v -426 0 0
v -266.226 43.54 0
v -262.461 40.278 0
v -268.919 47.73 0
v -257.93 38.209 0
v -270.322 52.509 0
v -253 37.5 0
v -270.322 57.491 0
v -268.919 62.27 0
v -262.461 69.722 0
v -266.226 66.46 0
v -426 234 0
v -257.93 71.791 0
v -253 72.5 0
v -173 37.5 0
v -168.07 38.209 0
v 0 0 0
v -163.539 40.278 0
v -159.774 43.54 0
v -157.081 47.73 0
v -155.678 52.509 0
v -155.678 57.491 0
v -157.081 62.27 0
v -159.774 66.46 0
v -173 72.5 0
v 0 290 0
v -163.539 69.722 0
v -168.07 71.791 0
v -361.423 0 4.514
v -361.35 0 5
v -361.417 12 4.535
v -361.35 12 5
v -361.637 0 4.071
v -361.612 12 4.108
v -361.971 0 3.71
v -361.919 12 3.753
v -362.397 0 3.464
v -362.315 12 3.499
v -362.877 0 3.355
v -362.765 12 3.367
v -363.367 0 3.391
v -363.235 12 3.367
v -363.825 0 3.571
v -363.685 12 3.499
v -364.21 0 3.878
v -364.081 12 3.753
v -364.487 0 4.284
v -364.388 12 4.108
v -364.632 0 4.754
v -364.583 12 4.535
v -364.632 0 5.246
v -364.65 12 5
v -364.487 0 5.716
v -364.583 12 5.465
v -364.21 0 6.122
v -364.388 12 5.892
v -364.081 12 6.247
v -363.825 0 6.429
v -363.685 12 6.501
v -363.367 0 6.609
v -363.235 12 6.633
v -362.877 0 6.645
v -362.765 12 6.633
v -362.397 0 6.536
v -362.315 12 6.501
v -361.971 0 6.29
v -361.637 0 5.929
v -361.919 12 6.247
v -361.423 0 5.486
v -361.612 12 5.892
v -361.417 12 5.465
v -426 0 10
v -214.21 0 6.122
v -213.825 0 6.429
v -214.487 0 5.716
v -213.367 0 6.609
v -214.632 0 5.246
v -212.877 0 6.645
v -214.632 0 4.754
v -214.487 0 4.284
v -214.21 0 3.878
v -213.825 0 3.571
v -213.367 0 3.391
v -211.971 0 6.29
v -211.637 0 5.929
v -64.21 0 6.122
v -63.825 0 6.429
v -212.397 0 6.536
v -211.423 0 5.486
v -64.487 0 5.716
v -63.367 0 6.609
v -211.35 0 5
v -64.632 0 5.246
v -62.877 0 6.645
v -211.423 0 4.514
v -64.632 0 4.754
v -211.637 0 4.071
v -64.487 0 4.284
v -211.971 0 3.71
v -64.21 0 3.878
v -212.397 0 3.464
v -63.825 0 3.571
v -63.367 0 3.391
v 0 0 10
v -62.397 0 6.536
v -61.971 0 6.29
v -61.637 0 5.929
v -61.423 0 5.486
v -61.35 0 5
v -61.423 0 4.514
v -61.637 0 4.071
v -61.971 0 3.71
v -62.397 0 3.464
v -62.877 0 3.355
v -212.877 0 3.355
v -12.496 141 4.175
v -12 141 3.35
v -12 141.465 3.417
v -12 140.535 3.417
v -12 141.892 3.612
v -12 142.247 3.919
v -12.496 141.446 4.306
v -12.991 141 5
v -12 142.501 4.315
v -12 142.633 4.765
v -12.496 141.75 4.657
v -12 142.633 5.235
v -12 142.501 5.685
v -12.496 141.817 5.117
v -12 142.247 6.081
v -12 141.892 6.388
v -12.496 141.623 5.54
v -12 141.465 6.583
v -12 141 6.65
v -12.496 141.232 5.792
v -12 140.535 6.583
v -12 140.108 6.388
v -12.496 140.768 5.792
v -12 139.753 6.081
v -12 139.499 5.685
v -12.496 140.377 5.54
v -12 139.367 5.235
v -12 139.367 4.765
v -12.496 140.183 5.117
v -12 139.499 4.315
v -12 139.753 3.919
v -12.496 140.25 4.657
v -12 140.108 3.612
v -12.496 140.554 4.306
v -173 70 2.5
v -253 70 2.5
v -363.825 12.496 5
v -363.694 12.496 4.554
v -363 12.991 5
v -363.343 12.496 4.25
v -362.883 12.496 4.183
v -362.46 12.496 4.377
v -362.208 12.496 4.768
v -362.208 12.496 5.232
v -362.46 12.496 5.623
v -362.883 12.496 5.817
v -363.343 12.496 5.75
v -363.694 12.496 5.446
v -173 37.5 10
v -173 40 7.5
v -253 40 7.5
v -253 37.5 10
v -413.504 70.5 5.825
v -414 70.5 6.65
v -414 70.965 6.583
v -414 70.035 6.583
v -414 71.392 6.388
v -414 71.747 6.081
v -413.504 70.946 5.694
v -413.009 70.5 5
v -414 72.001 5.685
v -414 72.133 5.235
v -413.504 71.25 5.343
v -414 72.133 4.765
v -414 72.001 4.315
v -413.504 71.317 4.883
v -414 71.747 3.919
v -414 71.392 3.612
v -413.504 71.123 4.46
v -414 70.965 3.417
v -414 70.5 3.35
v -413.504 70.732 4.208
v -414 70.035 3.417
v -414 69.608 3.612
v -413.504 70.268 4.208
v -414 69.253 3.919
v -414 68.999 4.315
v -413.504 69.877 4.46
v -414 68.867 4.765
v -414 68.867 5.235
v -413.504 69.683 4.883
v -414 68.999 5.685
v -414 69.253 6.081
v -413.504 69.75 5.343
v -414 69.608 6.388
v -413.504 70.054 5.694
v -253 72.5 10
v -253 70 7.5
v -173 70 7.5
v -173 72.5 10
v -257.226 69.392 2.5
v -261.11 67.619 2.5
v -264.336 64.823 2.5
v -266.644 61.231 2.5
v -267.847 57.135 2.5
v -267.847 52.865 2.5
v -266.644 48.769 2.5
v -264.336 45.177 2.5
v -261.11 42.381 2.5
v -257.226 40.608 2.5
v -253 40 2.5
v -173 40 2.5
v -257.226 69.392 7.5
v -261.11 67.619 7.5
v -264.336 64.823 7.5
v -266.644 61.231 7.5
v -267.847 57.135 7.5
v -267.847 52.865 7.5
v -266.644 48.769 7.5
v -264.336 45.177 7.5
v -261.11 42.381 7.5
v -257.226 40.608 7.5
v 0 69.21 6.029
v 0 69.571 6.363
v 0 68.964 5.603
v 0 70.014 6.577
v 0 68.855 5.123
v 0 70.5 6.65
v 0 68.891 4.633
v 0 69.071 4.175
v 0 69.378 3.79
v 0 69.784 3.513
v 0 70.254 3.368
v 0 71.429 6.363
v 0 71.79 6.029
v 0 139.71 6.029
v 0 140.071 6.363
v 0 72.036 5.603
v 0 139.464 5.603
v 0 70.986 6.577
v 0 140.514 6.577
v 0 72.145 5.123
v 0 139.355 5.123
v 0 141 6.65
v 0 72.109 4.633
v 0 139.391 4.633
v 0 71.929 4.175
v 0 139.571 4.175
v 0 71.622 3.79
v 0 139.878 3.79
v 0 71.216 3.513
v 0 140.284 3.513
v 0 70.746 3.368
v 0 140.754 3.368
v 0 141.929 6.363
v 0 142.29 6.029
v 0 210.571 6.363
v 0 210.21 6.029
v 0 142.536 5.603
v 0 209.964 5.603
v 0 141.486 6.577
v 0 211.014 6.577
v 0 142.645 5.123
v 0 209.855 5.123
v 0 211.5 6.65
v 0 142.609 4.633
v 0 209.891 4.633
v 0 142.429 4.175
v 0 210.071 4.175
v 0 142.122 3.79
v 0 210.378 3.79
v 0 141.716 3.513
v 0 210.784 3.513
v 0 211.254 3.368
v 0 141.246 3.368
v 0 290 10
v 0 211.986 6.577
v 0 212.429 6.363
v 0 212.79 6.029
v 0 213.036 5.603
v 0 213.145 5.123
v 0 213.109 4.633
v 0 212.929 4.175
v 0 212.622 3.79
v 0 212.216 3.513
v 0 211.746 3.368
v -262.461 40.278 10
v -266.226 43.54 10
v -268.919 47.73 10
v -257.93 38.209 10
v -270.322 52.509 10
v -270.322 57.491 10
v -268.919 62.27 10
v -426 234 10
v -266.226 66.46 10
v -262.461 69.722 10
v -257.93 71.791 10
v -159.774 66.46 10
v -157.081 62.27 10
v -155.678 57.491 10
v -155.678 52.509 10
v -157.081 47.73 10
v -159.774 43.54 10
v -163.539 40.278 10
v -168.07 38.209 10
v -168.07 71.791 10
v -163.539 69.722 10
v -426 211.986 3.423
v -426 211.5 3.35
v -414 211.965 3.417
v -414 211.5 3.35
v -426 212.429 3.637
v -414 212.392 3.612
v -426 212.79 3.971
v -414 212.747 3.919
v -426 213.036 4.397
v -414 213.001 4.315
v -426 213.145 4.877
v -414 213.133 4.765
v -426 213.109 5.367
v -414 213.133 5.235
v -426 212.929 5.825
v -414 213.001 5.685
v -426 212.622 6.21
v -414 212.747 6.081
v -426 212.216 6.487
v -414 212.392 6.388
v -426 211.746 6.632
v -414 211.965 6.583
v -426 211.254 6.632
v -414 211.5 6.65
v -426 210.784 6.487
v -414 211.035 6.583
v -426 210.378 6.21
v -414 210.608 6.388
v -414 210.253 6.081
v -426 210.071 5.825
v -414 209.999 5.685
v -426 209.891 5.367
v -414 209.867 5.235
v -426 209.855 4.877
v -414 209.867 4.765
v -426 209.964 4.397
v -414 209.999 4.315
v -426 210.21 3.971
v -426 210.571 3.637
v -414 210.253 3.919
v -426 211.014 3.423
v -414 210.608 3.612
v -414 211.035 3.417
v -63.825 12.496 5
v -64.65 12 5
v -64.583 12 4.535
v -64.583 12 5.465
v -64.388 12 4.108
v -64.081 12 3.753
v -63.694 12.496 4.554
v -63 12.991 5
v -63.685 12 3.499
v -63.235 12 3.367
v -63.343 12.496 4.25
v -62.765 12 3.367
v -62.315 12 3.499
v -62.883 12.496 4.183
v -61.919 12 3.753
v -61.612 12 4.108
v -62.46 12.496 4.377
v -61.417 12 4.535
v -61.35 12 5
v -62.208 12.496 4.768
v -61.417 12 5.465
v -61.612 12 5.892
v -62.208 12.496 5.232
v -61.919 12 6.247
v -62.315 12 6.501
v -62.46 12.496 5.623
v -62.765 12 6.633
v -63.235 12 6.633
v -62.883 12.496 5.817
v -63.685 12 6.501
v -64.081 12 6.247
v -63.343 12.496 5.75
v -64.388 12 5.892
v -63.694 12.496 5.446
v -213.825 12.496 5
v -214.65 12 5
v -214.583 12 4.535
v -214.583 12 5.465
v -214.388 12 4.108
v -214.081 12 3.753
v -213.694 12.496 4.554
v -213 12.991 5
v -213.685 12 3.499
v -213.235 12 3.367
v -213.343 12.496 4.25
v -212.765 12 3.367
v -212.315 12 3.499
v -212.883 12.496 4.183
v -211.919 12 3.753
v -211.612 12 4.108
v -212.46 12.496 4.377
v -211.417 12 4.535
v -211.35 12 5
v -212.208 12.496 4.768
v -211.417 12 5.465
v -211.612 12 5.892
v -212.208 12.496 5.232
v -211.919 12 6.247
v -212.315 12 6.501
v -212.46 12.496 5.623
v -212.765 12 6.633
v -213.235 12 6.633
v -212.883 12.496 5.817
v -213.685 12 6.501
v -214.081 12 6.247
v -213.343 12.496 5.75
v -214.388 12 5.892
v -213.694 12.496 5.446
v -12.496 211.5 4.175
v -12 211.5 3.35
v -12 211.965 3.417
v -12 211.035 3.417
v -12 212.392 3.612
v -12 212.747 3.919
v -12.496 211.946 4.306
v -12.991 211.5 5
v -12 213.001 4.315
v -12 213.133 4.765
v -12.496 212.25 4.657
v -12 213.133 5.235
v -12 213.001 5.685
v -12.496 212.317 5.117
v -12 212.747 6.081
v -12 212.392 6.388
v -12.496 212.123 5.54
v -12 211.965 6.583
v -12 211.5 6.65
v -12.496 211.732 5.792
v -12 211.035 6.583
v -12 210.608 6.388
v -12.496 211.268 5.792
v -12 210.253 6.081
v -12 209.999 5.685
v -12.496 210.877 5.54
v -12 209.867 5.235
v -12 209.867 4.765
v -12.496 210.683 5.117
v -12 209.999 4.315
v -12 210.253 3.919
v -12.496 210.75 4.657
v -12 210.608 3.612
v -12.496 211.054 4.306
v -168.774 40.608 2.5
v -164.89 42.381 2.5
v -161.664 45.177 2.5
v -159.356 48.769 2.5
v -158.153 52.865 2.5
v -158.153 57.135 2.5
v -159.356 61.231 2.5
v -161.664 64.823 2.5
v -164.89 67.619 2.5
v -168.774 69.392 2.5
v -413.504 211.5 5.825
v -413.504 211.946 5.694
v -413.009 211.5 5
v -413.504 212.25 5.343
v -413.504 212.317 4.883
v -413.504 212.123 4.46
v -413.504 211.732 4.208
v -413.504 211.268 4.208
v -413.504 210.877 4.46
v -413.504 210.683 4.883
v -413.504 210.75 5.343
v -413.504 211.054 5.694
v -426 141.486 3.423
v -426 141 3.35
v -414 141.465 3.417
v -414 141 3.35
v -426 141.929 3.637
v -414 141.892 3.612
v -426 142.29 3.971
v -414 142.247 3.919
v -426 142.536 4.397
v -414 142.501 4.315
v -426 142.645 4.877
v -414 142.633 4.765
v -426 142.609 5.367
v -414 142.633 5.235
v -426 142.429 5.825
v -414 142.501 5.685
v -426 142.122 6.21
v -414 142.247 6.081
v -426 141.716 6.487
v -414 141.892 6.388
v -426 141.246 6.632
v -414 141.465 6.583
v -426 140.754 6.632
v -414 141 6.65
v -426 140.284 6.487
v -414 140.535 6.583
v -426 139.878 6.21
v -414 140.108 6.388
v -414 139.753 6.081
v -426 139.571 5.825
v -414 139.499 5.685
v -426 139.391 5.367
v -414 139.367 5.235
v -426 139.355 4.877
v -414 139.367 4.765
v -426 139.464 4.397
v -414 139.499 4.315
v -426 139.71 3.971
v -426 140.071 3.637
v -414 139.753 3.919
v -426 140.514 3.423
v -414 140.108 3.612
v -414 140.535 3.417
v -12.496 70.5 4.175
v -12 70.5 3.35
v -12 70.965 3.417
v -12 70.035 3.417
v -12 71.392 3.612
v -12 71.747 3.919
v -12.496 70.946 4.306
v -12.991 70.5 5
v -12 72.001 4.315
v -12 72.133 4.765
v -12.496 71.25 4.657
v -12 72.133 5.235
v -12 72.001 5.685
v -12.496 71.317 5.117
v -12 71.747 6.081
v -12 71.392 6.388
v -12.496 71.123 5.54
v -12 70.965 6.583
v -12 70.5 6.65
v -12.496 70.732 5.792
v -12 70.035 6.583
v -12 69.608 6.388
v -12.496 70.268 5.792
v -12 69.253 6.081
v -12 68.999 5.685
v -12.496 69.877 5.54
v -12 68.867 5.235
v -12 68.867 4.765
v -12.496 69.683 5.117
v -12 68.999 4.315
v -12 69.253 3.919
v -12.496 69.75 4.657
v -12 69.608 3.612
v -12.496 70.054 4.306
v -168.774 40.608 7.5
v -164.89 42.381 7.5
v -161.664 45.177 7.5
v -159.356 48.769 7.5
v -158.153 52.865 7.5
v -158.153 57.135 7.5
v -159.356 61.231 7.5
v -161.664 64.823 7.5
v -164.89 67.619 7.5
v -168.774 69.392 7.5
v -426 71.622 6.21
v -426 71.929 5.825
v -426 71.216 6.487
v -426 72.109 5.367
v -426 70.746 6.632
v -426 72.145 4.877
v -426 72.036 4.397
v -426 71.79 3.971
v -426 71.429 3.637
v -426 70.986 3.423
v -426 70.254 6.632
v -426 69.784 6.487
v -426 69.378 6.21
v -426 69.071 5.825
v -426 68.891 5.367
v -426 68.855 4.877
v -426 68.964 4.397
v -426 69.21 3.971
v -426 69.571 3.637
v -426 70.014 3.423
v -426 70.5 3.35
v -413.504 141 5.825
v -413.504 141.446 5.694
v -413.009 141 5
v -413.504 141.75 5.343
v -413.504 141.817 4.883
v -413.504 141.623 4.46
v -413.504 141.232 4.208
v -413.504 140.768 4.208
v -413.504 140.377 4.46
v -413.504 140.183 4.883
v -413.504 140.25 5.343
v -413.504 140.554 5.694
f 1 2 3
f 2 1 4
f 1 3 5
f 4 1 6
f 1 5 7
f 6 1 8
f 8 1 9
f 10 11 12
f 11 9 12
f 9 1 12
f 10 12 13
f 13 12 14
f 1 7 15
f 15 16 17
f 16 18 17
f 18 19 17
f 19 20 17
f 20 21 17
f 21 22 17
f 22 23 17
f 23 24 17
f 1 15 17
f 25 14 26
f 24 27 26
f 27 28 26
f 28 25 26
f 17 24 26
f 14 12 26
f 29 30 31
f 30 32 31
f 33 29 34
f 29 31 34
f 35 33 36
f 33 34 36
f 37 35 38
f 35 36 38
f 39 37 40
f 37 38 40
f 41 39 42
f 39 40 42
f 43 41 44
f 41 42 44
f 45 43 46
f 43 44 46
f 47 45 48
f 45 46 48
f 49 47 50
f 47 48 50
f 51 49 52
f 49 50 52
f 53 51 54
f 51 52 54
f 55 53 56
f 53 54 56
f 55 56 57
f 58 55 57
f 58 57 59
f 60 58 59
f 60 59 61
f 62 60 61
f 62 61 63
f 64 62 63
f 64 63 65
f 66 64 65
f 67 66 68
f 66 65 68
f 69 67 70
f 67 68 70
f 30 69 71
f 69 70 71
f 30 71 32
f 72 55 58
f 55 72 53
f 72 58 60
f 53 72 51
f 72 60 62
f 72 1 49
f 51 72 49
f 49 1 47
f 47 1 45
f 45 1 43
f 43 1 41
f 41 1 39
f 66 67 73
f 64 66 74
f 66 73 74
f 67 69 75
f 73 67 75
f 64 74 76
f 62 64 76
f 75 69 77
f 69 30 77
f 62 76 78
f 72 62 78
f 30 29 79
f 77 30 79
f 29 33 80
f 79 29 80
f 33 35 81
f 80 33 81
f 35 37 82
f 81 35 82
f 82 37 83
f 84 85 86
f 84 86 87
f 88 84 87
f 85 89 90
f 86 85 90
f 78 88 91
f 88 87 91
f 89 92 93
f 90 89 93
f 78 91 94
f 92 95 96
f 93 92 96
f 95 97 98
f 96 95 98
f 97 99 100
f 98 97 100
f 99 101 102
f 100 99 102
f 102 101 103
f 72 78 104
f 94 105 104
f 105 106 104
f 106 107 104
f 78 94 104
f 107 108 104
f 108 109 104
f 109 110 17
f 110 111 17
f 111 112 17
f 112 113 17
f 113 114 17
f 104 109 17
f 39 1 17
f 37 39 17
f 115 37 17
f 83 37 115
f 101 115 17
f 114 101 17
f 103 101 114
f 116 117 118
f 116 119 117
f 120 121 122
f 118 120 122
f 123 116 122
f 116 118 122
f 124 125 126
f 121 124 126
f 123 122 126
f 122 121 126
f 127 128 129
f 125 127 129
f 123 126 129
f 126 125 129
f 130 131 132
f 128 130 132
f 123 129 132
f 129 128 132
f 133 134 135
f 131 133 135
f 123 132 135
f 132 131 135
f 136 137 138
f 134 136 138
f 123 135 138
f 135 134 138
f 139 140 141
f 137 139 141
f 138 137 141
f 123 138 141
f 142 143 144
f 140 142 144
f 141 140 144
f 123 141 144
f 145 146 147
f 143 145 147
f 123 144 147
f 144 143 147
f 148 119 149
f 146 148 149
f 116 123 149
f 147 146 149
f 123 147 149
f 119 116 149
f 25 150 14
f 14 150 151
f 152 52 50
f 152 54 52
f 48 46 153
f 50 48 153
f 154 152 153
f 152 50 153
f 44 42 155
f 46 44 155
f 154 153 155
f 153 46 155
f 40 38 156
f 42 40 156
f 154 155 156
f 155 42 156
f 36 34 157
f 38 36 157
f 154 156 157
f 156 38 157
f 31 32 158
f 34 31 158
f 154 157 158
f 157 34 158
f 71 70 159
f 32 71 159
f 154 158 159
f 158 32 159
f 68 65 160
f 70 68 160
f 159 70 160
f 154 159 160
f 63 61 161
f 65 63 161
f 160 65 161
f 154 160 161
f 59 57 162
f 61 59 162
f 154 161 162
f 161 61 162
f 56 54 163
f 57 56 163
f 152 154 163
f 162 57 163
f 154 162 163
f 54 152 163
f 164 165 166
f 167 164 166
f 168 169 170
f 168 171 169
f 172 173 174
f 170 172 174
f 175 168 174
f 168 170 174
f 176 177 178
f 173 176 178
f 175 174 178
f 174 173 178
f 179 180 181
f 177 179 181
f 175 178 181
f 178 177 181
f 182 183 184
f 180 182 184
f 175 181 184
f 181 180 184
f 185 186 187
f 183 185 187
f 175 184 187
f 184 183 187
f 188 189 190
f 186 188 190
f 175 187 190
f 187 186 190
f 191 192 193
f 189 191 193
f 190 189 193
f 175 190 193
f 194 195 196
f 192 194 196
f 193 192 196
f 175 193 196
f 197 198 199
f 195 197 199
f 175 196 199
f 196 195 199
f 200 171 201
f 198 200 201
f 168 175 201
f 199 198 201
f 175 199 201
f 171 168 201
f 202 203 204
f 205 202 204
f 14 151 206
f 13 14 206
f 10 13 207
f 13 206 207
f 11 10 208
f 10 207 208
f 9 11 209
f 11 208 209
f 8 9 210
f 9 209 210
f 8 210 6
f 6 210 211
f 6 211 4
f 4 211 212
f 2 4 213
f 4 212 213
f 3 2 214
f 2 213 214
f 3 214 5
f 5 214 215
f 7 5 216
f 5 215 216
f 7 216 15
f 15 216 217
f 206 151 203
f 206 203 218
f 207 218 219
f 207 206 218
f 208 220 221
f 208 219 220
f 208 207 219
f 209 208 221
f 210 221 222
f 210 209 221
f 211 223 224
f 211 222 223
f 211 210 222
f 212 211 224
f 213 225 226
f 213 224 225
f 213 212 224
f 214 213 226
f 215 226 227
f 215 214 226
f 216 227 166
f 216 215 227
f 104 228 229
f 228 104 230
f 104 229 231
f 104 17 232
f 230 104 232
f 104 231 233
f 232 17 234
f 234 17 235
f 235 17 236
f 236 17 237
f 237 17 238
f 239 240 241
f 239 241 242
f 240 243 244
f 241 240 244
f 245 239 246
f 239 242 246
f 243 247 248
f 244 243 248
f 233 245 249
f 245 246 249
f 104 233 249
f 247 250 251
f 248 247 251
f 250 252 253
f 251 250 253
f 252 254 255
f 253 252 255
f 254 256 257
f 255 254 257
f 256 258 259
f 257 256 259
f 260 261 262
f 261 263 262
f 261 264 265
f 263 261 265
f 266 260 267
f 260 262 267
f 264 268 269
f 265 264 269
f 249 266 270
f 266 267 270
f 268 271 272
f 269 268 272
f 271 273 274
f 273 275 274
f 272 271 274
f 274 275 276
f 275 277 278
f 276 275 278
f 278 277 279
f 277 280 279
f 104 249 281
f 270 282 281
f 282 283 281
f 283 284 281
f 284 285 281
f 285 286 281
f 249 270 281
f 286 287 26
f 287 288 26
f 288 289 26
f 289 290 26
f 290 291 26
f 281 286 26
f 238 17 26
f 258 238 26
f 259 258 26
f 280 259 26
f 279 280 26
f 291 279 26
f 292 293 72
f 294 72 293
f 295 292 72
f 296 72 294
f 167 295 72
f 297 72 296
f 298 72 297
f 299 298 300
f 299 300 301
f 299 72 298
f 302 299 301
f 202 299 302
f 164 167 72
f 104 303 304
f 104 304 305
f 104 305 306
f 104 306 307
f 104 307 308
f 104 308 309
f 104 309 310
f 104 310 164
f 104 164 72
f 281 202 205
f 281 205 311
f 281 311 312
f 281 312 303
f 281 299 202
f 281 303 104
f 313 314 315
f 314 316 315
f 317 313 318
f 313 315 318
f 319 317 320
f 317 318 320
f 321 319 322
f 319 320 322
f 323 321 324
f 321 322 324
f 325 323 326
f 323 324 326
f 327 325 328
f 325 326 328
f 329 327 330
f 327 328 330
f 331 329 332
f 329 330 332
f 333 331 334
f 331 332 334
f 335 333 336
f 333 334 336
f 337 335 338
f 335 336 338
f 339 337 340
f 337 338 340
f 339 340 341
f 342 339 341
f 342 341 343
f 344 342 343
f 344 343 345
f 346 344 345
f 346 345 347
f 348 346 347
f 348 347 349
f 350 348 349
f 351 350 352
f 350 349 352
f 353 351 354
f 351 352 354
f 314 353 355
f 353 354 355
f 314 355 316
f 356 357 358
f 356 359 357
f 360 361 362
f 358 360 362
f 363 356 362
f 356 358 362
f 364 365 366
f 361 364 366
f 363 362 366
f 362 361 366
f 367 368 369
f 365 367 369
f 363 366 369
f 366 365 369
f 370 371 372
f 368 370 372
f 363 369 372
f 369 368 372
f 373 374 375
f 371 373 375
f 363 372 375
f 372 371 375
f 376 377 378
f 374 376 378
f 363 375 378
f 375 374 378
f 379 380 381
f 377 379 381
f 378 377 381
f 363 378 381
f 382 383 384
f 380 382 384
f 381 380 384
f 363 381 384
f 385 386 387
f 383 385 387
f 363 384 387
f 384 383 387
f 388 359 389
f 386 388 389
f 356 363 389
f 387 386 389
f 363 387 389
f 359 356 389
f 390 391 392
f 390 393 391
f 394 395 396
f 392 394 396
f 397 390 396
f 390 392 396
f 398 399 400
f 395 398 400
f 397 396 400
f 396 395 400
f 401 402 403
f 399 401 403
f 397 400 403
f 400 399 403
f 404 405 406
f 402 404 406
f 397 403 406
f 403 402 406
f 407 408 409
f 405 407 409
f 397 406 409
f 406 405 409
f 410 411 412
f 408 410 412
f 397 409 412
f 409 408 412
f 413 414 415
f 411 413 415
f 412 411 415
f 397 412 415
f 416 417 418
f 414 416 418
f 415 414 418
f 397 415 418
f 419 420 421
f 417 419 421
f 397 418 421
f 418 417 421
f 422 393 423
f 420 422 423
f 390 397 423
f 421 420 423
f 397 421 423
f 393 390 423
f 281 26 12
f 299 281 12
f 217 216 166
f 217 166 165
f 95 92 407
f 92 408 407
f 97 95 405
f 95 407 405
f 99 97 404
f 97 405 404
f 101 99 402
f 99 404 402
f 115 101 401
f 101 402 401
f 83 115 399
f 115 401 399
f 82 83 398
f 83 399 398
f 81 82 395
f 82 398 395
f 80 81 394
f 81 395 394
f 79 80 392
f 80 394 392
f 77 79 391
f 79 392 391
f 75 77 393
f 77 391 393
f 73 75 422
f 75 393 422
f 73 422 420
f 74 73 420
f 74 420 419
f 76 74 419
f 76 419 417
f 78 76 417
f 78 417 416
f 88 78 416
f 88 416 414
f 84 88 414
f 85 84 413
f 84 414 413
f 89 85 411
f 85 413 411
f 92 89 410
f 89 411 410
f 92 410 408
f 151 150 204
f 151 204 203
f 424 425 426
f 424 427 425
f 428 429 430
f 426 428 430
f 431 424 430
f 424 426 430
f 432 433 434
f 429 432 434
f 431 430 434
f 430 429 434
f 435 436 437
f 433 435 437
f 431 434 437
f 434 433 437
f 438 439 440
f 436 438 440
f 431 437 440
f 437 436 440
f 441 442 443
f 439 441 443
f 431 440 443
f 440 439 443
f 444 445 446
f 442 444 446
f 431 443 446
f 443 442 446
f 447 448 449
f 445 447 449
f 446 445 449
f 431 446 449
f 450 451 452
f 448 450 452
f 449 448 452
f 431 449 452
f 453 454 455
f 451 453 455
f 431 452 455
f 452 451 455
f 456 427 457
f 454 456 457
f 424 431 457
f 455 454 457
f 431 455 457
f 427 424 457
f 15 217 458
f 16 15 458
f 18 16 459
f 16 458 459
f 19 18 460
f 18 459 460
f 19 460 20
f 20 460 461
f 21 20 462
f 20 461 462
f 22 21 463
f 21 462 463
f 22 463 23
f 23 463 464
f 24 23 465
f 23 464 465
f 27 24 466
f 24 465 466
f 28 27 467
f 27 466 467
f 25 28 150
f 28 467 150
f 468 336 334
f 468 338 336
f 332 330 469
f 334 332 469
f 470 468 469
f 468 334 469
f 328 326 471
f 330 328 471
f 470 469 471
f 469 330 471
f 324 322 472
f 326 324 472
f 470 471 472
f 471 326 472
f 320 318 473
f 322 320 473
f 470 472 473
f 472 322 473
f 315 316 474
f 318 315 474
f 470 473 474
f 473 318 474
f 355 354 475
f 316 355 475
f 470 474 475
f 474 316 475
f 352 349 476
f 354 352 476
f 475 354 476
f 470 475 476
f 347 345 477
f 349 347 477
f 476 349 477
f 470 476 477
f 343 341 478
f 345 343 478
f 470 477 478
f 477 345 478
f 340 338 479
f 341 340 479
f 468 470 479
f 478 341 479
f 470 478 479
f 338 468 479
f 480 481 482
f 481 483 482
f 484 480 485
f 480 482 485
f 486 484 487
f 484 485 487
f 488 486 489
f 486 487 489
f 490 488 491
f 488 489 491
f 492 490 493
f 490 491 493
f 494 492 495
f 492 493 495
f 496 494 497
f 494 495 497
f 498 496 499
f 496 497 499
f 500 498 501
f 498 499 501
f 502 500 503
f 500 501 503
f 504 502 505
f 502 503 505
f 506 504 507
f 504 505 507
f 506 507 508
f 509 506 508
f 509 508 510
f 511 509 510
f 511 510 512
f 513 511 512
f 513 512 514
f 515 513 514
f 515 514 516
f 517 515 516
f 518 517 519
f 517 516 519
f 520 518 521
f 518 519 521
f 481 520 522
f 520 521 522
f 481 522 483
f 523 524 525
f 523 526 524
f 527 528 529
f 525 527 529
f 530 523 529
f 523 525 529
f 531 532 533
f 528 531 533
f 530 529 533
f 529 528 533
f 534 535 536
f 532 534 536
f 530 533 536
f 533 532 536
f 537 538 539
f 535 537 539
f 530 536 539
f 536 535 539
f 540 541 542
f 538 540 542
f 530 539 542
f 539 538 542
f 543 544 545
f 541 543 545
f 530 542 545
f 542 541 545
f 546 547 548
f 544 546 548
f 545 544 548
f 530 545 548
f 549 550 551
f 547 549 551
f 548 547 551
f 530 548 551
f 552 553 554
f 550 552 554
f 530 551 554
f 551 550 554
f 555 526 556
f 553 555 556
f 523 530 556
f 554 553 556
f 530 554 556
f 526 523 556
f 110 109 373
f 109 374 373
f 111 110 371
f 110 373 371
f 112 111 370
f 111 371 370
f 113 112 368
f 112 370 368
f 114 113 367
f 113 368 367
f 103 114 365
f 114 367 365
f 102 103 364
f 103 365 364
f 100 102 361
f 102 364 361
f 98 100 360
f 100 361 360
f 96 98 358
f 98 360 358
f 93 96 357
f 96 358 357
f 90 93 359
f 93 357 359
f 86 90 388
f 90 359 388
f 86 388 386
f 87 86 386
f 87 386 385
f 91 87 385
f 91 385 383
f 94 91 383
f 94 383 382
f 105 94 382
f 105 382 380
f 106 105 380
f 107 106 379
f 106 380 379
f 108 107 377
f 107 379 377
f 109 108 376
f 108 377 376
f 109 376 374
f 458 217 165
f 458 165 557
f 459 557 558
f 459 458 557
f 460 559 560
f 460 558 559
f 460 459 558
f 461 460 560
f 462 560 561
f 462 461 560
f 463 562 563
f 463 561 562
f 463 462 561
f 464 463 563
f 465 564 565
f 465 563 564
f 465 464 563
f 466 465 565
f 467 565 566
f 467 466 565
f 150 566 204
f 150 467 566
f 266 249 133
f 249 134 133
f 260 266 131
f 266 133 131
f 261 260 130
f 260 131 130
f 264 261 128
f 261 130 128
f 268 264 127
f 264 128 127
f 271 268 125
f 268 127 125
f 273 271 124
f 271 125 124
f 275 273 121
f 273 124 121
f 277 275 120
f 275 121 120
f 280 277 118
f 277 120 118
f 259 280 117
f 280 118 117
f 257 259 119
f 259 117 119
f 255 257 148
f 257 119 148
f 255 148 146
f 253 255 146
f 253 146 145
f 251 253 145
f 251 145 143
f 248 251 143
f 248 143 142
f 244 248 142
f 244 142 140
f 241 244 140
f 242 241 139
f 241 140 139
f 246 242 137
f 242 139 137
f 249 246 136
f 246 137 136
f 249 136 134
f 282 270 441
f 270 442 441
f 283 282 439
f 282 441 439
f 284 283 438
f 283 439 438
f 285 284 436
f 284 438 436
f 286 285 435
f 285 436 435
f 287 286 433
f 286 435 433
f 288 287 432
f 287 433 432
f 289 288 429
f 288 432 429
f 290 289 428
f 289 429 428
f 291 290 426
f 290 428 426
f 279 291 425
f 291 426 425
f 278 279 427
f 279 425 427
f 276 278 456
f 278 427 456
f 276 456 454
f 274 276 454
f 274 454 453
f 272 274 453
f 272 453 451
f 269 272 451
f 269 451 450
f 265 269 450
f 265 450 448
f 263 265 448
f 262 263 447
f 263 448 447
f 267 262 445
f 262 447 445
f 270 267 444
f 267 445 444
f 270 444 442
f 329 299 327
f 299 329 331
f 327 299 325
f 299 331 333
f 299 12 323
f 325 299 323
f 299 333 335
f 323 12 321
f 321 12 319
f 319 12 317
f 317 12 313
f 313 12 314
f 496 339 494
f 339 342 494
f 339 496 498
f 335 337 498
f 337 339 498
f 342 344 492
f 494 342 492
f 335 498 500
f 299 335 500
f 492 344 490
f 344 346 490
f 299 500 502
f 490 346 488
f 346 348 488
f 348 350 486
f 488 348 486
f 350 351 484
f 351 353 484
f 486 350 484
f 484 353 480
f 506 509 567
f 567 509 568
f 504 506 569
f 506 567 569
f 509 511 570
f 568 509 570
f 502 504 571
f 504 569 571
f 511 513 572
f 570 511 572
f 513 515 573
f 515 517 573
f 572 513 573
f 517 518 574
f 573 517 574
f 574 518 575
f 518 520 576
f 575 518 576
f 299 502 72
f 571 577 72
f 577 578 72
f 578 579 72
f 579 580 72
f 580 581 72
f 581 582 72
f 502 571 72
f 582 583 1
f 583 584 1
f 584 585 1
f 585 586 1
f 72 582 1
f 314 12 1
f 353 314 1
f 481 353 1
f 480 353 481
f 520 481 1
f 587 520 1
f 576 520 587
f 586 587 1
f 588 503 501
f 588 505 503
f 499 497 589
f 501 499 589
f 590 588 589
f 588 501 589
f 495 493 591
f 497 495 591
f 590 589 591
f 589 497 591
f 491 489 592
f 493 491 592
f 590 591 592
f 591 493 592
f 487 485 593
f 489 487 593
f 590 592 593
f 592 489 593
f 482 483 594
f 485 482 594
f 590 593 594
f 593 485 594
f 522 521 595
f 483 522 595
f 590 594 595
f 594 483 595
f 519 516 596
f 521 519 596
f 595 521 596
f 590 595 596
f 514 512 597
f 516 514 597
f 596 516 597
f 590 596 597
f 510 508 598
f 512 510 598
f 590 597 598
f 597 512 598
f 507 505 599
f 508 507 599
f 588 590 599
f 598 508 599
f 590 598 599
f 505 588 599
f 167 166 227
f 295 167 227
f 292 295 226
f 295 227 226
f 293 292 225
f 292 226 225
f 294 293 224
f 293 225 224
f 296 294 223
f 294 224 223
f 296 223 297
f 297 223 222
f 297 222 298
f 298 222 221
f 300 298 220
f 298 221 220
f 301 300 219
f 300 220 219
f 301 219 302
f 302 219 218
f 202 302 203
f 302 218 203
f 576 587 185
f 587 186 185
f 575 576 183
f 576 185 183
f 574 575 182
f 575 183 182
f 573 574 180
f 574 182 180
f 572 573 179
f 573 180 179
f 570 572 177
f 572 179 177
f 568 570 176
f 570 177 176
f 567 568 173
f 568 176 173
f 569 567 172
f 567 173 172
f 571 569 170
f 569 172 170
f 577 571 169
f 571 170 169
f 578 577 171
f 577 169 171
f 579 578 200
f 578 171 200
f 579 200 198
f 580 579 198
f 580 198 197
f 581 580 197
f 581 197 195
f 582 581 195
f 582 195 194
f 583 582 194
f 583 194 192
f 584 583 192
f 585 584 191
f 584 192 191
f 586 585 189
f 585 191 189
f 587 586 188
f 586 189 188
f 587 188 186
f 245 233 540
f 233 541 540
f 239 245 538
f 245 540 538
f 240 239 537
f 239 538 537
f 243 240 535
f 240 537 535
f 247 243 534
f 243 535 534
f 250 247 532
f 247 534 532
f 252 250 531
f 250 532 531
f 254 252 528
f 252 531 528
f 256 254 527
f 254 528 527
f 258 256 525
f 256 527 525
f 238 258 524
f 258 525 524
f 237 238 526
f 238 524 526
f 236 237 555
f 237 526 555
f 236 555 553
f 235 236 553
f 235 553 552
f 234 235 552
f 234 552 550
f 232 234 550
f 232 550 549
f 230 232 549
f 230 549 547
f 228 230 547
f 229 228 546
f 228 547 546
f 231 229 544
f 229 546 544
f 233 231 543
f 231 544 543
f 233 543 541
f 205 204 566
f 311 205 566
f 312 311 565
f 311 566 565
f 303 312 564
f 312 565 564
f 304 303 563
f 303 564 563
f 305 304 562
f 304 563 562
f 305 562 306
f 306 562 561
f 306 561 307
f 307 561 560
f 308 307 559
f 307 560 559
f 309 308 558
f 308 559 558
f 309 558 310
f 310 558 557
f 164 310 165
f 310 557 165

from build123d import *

# Parameters (mm, degrees)
BOSS_EXTRUDE1_DEPTH       = 10
CUT_EXTRUDE1_DEPTH        = 516.437678095
CHAMFER1_SIZE             = 2.5
M4X0_7_TAPPED_HOLE1_D     = 3.3
M4X0_7_TAPPED_HOLE1_DEPTH = 12
M4X0_7_TAPPED_HOLE1_TIP   = 0.991420021
M4X0_7_TAPPED_HOLE2_D     = 3.3
M4X0_7_TAPPED_HOLE2_DEPTH = 12
M4X0_7_TAPPED_HOLE2_TIP   = 0.991420021
M4X0_7_TAPPED_HOLE3_D     = 3.3
M4X0_7_TAPPED_HOLE3_DEPTH = 12
M4X0_7_TAPPED_HOLE3_TIP   = 0.991420021


with BuildPart() as part:
    # Sketch1 → Boss-Extrude1 (new body)
    with BuildSketch(Plane.XY):
        Polygon((0, 234), (0, 290), (-426, 234), (-426, 0), (0, 0), align=None)
    extrude(amount=BOSS_EXTRUDE1_DEPTH)

    # Sketch2 → Cut-Extrude1 (cut, through all)
    with BuildSketch(Plane(origin=(0, 0, 0), x_dir=(-1, 0, 0), z_dir=(0, 0, -1))):
        with BuildLine():
            Line((173, 70), (253, 70))
            ThreePointArc((253, 70), (268, 55), (253, 40))
            Line((253, 40), (173, 40))
            ThreePointArc((173, 40), (158, 55), (173, 70))
        make_face()
    extrude(amount=-CUT_EXTRUDE1_DEPTH, mode=Mode.SUBTRACT)

    # Chamfer1
    chamfer1_edges = [part.edges().sort_by_distance(p)[0] for p in [
        (-268, 55, 10),
        (-213, 40, 10),
        (-158, 55, 10),
        (-213, 70, 10),
        (-268, 55, 0),
        (-213, 70, 0),
        (-158, 55, 0),
        (-213, 40, 0),
    ]]
    chamfer(chamfer1_edges, length=CHAMFER1_SIZE)

    # M4x0.7 Tapped Hole1
    with Locations(Plane(origin=(0, 0, 0), x_dir=(-1, 0, 0), z_dir=(0, -1, 0))):
        with Locations((63, -5), (213, -5), (363, -5)):
            Hole(M4X0_7_TAPPED_HOLE1_D / 2, depth=M4X0_7_TAPPED_HOLE1_DEPTH)
            with Locations((0, 0, -(M4X0_7_TAPPED_HOLE1_DEPTH + M4X0_7_TAPPED_HOLE1_TIP / 2))):  # 118° drill point
                Cone(0, M4X0_7_TAPPED_HOLE1_D / 2, M4X0_7_TAPPED_HOLE1_TIP, mode=Mode.SUBTRACT)

    # M4x0.7 Tapped Hole2
    with Locations(Plane.ZY.offset(426)):
        with Locations((5, 70.5), (5, 141), (5, 211.5)):
            Hole(M4X0_7_TAPPED_HOLE2_D / 2, depth=M4X0_7_TAPPED_HOLE2_DEPTH)
            with Locations((0, 0, -(M4X0_7_TAPPED_HOLE2_DEPTH + M4X0_7_TAPPED_HOLE2_TIP / 2))):  # 118° drill point
                Cone(0, M4X0_7_TAPPED_HOLE2_D / 2, M4X0_7_TAPPED_HOLE2_TIP, mode=Mode.SUBTRACT)

    # M4x0.7 Tapped Hole3
    with Locations(Plane(origin=(0, 0, 0), x_dir=(0, 0, -1), z_dir=(1, 0, 0))):
        with Locations((-5, 70.5), (-5, 141), (-5, 211.5)):
            Hole(M4X0_7_TAPPED_HOLE3_D / 2, depth=M4X0_7_TAPPED_HOLE3_DEPTH)
            with Locations((0, 0, -(M4X0_7_TAPPED_HOLE3_DEPTH + M4X0_7_TAPPED_HOLE3_TIP / 2))):  # 118° drill point
                Cone(0, M4X0_7_TAPPED_HOLE3_D / 2, M4X0_7_TAPPED_HOLE3_TIP, mode=Mode.SUBTRACT)


solid = part.part
